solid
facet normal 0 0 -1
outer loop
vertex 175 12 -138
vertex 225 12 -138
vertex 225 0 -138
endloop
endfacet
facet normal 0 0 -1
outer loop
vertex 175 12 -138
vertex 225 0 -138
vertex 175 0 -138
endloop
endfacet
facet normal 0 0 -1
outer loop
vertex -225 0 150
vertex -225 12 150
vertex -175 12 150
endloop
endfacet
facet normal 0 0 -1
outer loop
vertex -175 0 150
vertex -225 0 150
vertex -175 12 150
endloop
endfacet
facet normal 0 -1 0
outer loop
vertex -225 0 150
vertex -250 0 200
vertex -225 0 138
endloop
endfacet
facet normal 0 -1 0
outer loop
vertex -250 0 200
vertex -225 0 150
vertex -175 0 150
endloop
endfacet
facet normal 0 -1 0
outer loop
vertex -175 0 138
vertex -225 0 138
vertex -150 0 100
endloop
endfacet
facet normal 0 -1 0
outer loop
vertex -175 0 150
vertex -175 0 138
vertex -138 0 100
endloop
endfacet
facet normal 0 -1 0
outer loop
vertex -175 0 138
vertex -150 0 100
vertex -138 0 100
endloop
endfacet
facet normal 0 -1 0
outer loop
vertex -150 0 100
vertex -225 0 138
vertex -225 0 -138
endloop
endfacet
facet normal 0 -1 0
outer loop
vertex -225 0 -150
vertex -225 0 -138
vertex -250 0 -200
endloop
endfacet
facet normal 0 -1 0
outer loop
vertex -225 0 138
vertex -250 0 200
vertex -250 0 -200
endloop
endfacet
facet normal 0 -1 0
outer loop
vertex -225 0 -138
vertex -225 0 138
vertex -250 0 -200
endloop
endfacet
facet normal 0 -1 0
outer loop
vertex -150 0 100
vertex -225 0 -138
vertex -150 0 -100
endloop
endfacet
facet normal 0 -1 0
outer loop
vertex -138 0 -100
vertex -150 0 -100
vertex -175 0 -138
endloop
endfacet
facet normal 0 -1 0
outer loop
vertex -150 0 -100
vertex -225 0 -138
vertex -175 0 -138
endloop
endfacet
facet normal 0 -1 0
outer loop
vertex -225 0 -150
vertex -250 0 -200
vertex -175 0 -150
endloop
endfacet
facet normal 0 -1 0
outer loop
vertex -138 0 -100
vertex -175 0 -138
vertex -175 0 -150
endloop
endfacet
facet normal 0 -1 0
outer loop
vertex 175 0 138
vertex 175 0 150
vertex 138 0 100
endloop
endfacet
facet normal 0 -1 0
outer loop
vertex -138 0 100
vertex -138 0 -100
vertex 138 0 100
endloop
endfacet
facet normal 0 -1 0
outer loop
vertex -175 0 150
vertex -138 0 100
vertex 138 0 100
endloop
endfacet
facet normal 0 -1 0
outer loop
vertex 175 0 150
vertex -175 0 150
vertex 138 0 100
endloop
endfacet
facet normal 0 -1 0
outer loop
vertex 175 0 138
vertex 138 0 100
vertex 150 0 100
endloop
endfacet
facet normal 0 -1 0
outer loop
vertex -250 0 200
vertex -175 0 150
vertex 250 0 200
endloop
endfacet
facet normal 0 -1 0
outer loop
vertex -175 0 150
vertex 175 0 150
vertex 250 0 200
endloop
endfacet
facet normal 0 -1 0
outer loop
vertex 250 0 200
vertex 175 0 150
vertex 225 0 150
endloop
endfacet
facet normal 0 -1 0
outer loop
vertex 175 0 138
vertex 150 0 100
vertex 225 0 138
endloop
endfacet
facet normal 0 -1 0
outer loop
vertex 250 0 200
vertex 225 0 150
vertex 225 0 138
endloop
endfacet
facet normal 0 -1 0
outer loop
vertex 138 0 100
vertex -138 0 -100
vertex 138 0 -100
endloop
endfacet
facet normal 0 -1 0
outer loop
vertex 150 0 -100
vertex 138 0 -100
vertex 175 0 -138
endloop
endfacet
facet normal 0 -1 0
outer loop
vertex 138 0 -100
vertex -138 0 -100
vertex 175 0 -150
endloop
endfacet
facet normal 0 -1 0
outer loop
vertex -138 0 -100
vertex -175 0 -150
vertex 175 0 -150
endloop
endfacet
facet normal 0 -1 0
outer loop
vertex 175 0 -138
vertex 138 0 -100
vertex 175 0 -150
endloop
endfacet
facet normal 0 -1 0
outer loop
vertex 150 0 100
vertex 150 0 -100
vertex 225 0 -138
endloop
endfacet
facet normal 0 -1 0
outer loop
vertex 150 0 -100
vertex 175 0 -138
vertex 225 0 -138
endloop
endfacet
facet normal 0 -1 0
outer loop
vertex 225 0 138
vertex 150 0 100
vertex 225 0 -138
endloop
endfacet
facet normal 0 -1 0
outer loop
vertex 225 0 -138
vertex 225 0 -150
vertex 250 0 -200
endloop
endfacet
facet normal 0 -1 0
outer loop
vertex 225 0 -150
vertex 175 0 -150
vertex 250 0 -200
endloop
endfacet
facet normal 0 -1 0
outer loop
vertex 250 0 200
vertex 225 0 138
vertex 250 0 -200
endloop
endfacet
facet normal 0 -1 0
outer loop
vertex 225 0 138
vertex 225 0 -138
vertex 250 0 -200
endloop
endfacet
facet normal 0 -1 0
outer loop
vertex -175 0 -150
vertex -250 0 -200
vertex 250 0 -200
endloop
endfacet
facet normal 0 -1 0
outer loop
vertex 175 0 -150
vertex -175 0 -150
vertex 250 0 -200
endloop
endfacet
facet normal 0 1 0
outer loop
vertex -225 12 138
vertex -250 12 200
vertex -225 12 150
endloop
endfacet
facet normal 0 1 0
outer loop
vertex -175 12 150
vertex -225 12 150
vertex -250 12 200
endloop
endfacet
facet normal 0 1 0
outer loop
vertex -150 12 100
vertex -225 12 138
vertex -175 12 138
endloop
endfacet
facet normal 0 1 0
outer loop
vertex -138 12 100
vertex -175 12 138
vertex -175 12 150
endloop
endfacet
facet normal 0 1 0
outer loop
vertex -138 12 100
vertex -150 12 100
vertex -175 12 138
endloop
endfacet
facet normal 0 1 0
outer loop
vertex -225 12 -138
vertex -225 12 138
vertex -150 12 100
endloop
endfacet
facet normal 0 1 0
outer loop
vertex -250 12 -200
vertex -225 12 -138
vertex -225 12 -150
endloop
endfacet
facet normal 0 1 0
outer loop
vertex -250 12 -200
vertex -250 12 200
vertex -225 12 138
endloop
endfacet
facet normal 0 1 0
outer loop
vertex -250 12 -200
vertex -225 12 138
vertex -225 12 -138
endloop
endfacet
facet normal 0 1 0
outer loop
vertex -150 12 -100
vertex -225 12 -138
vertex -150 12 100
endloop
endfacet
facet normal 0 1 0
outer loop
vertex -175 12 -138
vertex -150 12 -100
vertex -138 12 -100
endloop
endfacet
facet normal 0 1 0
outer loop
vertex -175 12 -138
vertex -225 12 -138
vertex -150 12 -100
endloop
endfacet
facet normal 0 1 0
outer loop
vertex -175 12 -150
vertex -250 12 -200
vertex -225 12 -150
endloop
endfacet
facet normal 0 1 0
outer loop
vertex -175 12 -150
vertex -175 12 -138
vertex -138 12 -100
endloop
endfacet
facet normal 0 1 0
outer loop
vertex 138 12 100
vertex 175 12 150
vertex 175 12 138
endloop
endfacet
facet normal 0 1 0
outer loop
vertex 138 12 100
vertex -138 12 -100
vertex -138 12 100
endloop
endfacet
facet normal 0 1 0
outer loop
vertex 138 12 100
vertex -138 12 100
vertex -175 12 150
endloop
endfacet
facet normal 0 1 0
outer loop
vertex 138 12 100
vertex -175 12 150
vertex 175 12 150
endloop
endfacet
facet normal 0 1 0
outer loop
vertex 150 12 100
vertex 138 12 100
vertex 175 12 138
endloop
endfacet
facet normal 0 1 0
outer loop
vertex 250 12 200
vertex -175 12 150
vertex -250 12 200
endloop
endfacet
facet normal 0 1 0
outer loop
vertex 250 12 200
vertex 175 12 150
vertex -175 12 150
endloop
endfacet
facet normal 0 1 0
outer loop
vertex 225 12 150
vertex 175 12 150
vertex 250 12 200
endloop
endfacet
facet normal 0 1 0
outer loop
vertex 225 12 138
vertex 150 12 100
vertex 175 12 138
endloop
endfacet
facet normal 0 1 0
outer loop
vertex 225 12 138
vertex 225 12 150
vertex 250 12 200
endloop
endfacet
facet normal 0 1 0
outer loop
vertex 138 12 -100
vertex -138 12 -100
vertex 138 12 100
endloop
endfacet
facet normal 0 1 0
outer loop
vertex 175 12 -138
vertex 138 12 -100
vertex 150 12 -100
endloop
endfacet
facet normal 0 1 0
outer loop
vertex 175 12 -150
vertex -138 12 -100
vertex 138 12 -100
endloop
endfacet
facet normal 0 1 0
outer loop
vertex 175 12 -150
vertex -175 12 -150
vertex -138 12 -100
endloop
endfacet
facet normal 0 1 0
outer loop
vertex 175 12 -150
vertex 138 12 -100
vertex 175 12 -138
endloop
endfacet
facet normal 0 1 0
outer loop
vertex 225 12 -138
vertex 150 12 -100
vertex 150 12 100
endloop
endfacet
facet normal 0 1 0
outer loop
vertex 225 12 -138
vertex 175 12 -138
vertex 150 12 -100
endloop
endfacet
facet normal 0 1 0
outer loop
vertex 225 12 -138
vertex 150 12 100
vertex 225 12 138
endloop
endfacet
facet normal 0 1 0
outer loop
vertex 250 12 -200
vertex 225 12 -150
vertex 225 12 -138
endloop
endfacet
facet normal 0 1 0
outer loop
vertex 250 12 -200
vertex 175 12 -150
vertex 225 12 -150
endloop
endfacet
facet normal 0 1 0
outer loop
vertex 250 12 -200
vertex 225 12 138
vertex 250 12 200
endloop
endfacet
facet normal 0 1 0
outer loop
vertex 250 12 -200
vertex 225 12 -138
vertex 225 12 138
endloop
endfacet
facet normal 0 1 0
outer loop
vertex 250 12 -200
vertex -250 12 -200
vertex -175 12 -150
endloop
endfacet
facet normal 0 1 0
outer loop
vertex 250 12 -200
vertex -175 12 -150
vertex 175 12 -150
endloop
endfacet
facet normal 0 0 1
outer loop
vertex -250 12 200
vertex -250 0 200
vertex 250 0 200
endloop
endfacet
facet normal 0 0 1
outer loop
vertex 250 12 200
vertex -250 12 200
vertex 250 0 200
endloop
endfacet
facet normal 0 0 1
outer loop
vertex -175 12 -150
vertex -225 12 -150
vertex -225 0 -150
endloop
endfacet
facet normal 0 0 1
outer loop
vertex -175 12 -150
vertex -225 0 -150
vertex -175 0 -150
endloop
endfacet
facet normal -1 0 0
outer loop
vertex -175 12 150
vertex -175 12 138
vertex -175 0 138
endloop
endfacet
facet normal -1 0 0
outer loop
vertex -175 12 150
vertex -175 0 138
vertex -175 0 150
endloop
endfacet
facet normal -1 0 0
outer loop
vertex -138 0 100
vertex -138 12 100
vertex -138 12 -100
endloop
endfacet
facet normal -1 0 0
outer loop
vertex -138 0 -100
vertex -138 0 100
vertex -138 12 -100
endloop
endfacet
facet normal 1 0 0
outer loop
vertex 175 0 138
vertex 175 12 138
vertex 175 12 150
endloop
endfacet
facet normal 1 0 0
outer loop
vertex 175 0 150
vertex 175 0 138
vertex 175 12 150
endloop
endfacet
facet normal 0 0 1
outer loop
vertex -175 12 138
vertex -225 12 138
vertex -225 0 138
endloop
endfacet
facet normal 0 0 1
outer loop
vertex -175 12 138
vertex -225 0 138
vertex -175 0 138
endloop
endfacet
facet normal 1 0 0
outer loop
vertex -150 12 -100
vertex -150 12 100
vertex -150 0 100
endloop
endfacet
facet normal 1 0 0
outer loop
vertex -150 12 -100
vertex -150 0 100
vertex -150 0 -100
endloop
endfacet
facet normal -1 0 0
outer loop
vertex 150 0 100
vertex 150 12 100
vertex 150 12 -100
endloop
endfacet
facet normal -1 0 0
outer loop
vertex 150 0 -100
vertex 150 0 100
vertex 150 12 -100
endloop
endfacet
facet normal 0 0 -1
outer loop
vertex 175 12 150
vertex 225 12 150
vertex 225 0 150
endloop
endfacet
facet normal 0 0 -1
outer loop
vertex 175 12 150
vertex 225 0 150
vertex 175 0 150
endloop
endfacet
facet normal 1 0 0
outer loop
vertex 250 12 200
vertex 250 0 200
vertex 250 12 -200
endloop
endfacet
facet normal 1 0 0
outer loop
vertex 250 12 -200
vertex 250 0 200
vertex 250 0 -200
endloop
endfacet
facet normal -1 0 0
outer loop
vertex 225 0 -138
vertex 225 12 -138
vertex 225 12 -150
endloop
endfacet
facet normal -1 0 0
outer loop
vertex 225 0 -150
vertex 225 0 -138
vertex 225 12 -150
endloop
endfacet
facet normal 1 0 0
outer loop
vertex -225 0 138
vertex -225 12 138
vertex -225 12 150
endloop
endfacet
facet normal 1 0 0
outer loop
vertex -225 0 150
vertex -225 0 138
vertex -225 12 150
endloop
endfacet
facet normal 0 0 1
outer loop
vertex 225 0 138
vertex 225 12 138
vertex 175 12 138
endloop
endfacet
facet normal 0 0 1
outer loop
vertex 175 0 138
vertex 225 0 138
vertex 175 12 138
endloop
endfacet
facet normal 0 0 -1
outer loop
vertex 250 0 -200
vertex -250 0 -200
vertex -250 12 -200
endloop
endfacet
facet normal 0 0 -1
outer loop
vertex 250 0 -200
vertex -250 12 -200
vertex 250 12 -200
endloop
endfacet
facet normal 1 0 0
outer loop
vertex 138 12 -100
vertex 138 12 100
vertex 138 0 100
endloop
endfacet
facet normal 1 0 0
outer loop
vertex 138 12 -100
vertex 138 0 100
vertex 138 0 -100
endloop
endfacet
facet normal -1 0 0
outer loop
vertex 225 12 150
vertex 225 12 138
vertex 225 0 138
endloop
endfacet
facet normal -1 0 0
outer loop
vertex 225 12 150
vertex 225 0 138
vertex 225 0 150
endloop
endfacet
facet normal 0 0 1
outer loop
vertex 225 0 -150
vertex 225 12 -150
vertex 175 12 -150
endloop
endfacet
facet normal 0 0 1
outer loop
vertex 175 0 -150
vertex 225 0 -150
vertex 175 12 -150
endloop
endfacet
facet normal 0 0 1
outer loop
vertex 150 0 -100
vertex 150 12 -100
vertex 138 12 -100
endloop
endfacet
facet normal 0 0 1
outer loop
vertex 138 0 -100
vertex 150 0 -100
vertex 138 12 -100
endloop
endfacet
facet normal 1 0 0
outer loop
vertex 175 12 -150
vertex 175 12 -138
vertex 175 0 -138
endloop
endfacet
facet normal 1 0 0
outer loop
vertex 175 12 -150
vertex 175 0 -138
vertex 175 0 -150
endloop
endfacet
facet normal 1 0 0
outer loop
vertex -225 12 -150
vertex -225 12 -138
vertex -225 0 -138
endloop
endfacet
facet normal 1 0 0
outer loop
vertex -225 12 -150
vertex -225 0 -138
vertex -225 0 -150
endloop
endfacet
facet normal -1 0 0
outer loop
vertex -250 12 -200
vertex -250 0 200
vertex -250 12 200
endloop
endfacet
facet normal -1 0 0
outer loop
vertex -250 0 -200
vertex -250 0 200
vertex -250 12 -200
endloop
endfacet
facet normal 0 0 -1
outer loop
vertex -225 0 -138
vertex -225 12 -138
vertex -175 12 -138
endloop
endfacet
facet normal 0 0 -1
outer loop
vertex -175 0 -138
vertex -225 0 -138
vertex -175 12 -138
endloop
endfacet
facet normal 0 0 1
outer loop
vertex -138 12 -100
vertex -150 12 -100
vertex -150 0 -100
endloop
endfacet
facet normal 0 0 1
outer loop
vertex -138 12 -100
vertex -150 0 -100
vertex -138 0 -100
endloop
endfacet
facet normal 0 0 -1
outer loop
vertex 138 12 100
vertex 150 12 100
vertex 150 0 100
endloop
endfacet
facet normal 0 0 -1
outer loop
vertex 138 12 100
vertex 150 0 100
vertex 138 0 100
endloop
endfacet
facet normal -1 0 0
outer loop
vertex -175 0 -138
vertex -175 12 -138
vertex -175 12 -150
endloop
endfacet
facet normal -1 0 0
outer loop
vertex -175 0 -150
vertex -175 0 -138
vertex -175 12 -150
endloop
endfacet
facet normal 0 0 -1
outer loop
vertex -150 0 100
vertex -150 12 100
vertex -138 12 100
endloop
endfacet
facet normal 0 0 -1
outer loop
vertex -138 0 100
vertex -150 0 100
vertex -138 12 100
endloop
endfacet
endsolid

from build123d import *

# Parameters (mm, degrees)
SKETCH1_W                                  = 500
SKETCH1_H                                  = 400
BOSS_EXTRUDE1_DEPTH                        = 12
SKETCH2_W                                  = 12
SKETCH2_H                                  = 200
CUT_EXTRUDE1_DEPTH                         = 12
SKETCH5_W                                  = 50
SKETCH5_H                                  = 12
CUT_EXTRUDE2_DEPTH                         = 12
MIRROR5_AT_THE_SECOND_PLANE_COPY_1_SKETC_W = 50
MIRROR5_AT_THE_SECOND_PLANE_COPY_1_SKETC_H = 12
MIRROR5_AT_THE_SECOND_PLANE_COPY_1_DEPTH   = 12


with BuildPart() as part:
    # Sketch1 → Boss-Extrude1 (new body)
    with BuildSketch(Plane(origin=(0, 0, 0), x_dir=(1, 0, 0), z_dir=(0, 1, 0))):
        Rectangle(SKETCH1_W, SKETCH1_H)
    extrude(amount=BOSS_EXTRUDE1_DEPTH)

    # Sketch2 → Cut-Extrude1 (cut)
    with BuildSketch(Plane(origin=(0, 12, 0), x_dir=(1, 0, 0), z_dir=(0, 1, 0))):
        with Locations((-144, 0)):
            Rectangle(SKETCH2_W, SKETCH2_H)
    cut_extrude1 = extrude(amount=-CUT_EXTRUDE1_DEPTH, mode=Mode.SUBTRACT)

    # Mirror2: Cut-Extrude1 across plane
    add(cut_extrude1.mirror(Plane(origin=(0, 0, 0), x_dir=(0, 0, 1), z_dir=(1, 0, 0))), mode=Mode.SUBTRACT)

    # Sketch5 → Cut-Extrude2 (cut)
    with BuildSketch(Plane(origin=(0, 12, 0), x_dir=(1, 0, 0), z_dir=(0, 1, 0))):
        with Locations((-200, 144)):
            Rectangle(SKETCH5_W, SKETCH5_H)
    cut_extrude2 = extrude(amount=-CUT_EXTRUDE2_DEPTH, mode=Mode.SUBTRACT)

    # Mirror5: Cut-Extrude2 across plane
    add(cut_extrude2.mirror(Plane.XY), mode=Mode.SUBTRACT)

    # Mirror5 at the second plane: Cut-Extrude2 across plane
    add(cut_extrude2.mirror(Plane(origin=(0, 0, 0), x_dir=(0, 0, 1), z_dir=(1, 0, 0))), mode=Mode.SUBTRACT)

    # Mirror5 at the second plane copy 1 sketc → Mirror5 at the second plane copy 1 (cut)
    with BuildSketch(Plane(origin=(0, 12, 0), x_dir=(-1, 0, 0), z_dir=(0, 1, 0))):
        with Locations((-200, 144)):
            Rectangle(MIRROR5_AT_THE_SECOND_PLANE_COPY_1_SKETC_W, MIRROR5_AT_THE_SECOND_PLANE_COPY_1_SKETC_H)
    extrude(amount=-MIRROR5_AT_THE_SECOND_PLANE_COPY_1_DEPTH, mode=Mode.SUBTRACT)


solid = part.part
